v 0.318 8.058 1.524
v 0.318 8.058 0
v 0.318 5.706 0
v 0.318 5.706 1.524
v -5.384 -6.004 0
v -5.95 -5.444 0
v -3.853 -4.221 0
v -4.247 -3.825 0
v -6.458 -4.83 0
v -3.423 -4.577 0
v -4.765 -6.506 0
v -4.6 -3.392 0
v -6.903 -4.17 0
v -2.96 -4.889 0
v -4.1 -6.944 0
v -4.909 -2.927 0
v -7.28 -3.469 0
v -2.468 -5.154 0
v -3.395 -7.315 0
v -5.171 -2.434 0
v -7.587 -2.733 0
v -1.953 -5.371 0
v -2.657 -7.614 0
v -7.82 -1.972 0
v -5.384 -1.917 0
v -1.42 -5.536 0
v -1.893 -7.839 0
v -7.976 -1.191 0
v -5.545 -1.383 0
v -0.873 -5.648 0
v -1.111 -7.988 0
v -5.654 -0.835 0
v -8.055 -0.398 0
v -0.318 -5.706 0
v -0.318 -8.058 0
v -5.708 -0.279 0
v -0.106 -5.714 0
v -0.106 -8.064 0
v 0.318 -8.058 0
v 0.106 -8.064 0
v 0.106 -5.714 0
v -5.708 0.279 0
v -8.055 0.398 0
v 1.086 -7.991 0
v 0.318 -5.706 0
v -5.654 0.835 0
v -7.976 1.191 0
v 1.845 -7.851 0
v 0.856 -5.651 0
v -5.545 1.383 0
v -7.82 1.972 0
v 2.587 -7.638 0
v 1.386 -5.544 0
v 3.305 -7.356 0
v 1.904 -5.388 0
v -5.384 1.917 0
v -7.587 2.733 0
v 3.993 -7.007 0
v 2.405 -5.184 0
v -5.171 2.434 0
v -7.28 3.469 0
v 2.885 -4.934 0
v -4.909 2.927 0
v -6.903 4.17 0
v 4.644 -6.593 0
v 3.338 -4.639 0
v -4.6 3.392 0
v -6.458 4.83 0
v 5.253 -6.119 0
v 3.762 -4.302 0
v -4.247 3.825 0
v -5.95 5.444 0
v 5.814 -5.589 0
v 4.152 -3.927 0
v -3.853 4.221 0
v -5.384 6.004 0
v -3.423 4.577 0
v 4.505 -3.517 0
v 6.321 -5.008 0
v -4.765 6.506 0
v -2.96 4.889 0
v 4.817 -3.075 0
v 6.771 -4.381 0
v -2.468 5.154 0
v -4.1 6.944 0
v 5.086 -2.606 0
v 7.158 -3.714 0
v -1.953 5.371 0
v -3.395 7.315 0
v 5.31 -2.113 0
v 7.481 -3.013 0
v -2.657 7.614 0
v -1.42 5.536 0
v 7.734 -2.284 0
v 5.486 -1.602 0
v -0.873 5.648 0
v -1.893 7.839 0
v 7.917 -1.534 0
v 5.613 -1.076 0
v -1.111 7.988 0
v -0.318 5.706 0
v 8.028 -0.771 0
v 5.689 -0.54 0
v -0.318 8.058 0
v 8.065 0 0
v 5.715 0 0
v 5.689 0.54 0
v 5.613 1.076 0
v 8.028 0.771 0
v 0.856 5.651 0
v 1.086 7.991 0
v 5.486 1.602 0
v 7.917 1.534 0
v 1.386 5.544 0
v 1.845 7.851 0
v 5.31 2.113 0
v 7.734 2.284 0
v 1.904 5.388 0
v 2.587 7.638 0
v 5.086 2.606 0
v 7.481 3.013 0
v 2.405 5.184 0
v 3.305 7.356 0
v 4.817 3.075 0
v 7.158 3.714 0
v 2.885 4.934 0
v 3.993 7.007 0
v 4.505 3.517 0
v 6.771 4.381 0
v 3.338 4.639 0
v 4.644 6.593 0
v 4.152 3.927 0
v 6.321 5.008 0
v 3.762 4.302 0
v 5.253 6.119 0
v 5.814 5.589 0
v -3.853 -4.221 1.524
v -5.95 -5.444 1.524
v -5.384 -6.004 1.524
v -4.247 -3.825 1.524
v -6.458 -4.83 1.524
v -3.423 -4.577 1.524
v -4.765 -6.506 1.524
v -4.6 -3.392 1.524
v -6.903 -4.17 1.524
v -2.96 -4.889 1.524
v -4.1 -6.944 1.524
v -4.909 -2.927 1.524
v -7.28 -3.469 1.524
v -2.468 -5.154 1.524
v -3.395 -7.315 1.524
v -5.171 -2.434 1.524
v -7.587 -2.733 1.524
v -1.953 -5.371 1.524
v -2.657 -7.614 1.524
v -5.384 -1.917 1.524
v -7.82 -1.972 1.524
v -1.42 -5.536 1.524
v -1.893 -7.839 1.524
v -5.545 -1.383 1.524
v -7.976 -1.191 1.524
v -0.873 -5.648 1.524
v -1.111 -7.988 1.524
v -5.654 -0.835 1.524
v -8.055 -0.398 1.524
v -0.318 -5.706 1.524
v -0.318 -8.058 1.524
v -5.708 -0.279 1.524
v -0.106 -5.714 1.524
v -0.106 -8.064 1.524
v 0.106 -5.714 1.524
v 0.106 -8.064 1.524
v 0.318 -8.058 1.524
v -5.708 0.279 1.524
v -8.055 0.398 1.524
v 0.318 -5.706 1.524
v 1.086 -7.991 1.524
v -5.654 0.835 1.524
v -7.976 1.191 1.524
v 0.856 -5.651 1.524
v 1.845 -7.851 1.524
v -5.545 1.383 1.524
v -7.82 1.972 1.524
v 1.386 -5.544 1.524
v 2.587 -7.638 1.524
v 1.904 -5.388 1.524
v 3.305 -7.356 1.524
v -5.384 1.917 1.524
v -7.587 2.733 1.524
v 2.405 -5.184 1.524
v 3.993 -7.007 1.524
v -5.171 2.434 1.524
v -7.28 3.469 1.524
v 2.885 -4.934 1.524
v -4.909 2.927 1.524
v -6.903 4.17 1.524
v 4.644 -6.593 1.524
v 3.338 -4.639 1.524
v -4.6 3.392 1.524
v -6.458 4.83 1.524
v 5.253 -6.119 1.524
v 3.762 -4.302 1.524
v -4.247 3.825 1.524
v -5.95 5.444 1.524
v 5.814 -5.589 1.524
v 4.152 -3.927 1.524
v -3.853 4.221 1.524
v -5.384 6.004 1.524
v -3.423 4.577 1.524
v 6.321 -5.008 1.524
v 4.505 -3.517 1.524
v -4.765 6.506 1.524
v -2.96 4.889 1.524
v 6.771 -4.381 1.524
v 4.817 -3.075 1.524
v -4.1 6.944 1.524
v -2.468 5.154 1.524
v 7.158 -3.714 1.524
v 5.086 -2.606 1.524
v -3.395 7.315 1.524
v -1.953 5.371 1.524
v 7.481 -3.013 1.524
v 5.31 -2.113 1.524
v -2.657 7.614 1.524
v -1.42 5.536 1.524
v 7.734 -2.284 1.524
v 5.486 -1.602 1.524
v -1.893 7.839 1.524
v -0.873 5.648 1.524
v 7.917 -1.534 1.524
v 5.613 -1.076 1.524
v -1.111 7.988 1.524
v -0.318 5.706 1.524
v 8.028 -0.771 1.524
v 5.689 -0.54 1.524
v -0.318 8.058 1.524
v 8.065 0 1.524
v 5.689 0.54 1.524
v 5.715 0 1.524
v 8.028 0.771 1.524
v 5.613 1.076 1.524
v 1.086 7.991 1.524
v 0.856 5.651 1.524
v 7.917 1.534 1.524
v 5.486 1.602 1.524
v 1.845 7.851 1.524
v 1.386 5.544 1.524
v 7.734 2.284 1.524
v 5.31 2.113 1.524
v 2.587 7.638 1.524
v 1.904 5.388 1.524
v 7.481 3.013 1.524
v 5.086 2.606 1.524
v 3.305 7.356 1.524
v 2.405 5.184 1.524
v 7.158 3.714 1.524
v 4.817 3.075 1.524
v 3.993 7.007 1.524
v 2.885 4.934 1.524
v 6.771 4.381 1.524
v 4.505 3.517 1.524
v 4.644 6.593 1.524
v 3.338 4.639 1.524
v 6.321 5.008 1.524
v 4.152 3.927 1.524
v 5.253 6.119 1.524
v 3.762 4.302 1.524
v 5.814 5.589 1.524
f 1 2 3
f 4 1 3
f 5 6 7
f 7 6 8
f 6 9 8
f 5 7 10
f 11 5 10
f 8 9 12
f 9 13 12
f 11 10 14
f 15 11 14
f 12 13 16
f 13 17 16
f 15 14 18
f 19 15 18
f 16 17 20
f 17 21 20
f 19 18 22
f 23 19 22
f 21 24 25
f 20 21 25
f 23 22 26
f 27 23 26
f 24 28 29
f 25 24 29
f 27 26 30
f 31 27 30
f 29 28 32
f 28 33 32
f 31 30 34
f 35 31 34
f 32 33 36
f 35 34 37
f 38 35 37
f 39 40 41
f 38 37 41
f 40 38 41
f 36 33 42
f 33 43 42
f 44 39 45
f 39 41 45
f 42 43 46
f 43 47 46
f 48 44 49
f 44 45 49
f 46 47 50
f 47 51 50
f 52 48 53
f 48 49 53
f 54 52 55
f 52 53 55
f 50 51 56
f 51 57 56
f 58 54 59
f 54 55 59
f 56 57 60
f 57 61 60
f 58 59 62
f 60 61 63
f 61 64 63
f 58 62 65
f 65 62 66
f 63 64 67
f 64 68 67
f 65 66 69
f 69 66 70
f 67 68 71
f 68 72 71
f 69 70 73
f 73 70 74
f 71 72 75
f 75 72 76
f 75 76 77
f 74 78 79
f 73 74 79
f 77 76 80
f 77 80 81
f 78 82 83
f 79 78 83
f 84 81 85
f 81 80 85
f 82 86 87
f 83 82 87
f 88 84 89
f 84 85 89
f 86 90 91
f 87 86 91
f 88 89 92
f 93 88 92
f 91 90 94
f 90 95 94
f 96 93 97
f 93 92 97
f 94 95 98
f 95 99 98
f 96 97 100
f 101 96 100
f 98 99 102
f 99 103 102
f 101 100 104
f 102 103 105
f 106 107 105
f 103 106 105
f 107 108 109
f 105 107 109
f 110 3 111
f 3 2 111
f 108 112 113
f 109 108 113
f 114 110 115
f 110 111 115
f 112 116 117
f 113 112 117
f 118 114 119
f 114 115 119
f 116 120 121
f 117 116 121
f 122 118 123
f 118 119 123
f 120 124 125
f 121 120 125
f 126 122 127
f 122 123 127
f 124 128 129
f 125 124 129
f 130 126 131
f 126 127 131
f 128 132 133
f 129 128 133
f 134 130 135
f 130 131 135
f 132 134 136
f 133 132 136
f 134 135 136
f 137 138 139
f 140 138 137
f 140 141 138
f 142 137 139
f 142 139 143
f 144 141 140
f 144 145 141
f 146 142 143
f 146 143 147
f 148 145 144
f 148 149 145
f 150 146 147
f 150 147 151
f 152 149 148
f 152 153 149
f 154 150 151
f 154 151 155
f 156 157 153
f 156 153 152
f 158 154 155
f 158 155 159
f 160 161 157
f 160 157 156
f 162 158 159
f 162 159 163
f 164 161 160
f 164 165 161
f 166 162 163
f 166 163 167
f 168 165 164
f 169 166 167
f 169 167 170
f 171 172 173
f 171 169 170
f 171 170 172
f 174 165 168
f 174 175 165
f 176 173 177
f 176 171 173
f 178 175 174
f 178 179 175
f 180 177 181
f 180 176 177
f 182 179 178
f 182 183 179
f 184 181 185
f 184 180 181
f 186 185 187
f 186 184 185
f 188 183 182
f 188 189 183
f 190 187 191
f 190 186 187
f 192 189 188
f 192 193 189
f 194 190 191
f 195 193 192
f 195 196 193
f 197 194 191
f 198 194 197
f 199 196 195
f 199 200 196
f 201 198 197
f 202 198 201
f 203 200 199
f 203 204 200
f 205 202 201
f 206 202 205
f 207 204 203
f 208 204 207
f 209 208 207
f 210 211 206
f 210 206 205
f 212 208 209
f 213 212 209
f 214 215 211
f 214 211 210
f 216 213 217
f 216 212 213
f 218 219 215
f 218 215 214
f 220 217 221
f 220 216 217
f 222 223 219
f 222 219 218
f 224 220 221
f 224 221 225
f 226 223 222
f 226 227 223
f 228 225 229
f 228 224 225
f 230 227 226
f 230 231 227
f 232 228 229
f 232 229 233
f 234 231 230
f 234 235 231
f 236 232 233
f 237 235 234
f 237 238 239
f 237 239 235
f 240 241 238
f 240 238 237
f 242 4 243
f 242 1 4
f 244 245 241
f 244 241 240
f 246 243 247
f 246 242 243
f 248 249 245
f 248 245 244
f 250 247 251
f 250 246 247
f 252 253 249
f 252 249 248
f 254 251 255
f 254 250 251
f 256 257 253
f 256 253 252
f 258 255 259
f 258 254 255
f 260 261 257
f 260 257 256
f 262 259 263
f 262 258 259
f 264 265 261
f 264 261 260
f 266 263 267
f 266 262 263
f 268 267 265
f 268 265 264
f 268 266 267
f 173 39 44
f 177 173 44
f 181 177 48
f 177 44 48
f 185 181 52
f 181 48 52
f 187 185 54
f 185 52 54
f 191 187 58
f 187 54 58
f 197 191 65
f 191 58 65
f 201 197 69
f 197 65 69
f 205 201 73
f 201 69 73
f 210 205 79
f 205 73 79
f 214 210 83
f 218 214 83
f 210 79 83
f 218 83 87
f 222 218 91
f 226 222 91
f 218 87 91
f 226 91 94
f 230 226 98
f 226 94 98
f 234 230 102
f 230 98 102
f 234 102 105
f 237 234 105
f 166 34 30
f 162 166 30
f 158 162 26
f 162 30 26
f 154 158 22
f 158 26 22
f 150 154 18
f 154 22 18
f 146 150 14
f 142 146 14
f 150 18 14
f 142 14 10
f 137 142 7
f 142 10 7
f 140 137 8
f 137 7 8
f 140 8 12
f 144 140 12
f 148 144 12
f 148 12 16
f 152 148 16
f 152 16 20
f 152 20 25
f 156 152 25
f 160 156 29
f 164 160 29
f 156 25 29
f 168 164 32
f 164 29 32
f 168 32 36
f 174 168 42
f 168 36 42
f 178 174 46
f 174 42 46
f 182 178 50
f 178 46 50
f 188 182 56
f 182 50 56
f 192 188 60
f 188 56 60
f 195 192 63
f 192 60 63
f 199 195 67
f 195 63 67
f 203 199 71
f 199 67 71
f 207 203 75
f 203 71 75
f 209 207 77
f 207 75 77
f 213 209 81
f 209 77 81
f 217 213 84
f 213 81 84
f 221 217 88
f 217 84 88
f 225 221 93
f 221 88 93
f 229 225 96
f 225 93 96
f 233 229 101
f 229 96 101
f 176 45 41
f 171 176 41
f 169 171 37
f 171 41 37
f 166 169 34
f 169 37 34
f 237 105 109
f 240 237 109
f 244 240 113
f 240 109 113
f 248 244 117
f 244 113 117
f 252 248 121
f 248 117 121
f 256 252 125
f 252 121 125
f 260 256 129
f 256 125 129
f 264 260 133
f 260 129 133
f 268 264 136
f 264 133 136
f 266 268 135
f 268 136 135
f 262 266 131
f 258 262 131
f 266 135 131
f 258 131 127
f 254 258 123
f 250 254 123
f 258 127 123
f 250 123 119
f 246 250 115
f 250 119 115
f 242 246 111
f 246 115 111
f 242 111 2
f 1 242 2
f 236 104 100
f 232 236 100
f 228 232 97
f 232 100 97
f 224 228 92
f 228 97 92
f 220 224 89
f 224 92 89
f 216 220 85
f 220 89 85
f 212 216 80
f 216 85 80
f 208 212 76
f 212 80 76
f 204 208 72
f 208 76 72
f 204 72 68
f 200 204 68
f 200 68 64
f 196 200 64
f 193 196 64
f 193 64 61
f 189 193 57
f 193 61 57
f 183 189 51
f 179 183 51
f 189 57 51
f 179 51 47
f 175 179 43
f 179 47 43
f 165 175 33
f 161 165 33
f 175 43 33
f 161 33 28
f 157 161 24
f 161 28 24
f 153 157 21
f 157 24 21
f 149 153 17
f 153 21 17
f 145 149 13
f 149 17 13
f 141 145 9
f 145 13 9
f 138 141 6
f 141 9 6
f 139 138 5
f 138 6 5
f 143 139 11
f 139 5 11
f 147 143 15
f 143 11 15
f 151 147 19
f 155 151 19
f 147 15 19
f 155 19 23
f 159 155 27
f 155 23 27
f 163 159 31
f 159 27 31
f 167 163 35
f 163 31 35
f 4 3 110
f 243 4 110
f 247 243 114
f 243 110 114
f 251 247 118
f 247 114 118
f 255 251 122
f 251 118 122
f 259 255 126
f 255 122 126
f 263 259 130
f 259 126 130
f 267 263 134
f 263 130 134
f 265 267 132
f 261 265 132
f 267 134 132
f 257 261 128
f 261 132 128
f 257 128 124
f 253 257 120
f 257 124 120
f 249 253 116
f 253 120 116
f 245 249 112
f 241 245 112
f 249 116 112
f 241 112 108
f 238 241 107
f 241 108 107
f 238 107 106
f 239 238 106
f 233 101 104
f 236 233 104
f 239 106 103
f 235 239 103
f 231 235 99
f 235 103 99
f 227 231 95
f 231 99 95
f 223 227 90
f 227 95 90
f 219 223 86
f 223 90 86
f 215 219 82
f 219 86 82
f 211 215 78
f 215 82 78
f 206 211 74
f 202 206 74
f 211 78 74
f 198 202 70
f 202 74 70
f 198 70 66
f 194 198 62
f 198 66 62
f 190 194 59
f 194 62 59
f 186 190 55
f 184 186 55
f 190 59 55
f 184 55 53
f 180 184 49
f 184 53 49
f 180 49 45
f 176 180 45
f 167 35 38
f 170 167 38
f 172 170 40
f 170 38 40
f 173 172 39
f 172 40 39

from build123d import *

# Parameters (mm, degrees)
F1_DEPTH = 1.524


# Not quite as in the source:
# - a feature names something its author has since deleted; it is built from what else it names


with BuildPart() as f1:
    # F0 (on Top) → F1 (new body)
    with BuildSketch(Plane.XY):
        with BuildLine():
            ThreePointArc((0.3175, 5.7061737399), (4.1518512437, 3.9272581084), (5.715, 0))
            ThreePointArc((5.715, 0), (4.1518512437, -3.9272581084), (0.3175, -5.7061737399))
            Line((0.3175, -5.7061737399), (0.3175, -8.0582475762))
            ThreePointArc((0.3175, -8.0582475762), (5.8136322123, -5.5890822816), (8.0645, 0))
            ThreePointArc((8.0645, 0), (5.8136322123, 5.5890822816), (0.3175, 8.0582475762))
            Line((0.3175, 8.0582475762), (0.3175, 5.7061737399))
        make_face()
        with BuildLine():
            Line((0.3175, -8.0582475762), (0.3175, -5.7061737399))
            ThreePointArc((0.3175, -5.7061737399), (0, -5.715), (-0.3175, -5.7061737399))
            Line((-0.3175, -5.7061737399), (-0.3175, -8.0582475762))
            ThreePointArc((-0.3175, -8.0582475762), (0, -8.0645), (0.3175, -8.0582475762))
        make_face()
        with BuildLine():
            ThreePointArc((-0.3175, -5.7061737399), (-5.715, 0), (-0.3175, 5.7061737399))
            Line((-0.3175, 5.7061737399), (-0.3175, 8.0582475762))
            ThreePointArc((-0.3175, 8.0582475762), (-8.0645, 0), (-0.3175, -8.0582475762))
            Line((-0.3175, -8.0582475762), (-0.3175, -5.7061737399))
        make_face()
    extrude(amount=F1_DEPTH)


solid = f1.part
